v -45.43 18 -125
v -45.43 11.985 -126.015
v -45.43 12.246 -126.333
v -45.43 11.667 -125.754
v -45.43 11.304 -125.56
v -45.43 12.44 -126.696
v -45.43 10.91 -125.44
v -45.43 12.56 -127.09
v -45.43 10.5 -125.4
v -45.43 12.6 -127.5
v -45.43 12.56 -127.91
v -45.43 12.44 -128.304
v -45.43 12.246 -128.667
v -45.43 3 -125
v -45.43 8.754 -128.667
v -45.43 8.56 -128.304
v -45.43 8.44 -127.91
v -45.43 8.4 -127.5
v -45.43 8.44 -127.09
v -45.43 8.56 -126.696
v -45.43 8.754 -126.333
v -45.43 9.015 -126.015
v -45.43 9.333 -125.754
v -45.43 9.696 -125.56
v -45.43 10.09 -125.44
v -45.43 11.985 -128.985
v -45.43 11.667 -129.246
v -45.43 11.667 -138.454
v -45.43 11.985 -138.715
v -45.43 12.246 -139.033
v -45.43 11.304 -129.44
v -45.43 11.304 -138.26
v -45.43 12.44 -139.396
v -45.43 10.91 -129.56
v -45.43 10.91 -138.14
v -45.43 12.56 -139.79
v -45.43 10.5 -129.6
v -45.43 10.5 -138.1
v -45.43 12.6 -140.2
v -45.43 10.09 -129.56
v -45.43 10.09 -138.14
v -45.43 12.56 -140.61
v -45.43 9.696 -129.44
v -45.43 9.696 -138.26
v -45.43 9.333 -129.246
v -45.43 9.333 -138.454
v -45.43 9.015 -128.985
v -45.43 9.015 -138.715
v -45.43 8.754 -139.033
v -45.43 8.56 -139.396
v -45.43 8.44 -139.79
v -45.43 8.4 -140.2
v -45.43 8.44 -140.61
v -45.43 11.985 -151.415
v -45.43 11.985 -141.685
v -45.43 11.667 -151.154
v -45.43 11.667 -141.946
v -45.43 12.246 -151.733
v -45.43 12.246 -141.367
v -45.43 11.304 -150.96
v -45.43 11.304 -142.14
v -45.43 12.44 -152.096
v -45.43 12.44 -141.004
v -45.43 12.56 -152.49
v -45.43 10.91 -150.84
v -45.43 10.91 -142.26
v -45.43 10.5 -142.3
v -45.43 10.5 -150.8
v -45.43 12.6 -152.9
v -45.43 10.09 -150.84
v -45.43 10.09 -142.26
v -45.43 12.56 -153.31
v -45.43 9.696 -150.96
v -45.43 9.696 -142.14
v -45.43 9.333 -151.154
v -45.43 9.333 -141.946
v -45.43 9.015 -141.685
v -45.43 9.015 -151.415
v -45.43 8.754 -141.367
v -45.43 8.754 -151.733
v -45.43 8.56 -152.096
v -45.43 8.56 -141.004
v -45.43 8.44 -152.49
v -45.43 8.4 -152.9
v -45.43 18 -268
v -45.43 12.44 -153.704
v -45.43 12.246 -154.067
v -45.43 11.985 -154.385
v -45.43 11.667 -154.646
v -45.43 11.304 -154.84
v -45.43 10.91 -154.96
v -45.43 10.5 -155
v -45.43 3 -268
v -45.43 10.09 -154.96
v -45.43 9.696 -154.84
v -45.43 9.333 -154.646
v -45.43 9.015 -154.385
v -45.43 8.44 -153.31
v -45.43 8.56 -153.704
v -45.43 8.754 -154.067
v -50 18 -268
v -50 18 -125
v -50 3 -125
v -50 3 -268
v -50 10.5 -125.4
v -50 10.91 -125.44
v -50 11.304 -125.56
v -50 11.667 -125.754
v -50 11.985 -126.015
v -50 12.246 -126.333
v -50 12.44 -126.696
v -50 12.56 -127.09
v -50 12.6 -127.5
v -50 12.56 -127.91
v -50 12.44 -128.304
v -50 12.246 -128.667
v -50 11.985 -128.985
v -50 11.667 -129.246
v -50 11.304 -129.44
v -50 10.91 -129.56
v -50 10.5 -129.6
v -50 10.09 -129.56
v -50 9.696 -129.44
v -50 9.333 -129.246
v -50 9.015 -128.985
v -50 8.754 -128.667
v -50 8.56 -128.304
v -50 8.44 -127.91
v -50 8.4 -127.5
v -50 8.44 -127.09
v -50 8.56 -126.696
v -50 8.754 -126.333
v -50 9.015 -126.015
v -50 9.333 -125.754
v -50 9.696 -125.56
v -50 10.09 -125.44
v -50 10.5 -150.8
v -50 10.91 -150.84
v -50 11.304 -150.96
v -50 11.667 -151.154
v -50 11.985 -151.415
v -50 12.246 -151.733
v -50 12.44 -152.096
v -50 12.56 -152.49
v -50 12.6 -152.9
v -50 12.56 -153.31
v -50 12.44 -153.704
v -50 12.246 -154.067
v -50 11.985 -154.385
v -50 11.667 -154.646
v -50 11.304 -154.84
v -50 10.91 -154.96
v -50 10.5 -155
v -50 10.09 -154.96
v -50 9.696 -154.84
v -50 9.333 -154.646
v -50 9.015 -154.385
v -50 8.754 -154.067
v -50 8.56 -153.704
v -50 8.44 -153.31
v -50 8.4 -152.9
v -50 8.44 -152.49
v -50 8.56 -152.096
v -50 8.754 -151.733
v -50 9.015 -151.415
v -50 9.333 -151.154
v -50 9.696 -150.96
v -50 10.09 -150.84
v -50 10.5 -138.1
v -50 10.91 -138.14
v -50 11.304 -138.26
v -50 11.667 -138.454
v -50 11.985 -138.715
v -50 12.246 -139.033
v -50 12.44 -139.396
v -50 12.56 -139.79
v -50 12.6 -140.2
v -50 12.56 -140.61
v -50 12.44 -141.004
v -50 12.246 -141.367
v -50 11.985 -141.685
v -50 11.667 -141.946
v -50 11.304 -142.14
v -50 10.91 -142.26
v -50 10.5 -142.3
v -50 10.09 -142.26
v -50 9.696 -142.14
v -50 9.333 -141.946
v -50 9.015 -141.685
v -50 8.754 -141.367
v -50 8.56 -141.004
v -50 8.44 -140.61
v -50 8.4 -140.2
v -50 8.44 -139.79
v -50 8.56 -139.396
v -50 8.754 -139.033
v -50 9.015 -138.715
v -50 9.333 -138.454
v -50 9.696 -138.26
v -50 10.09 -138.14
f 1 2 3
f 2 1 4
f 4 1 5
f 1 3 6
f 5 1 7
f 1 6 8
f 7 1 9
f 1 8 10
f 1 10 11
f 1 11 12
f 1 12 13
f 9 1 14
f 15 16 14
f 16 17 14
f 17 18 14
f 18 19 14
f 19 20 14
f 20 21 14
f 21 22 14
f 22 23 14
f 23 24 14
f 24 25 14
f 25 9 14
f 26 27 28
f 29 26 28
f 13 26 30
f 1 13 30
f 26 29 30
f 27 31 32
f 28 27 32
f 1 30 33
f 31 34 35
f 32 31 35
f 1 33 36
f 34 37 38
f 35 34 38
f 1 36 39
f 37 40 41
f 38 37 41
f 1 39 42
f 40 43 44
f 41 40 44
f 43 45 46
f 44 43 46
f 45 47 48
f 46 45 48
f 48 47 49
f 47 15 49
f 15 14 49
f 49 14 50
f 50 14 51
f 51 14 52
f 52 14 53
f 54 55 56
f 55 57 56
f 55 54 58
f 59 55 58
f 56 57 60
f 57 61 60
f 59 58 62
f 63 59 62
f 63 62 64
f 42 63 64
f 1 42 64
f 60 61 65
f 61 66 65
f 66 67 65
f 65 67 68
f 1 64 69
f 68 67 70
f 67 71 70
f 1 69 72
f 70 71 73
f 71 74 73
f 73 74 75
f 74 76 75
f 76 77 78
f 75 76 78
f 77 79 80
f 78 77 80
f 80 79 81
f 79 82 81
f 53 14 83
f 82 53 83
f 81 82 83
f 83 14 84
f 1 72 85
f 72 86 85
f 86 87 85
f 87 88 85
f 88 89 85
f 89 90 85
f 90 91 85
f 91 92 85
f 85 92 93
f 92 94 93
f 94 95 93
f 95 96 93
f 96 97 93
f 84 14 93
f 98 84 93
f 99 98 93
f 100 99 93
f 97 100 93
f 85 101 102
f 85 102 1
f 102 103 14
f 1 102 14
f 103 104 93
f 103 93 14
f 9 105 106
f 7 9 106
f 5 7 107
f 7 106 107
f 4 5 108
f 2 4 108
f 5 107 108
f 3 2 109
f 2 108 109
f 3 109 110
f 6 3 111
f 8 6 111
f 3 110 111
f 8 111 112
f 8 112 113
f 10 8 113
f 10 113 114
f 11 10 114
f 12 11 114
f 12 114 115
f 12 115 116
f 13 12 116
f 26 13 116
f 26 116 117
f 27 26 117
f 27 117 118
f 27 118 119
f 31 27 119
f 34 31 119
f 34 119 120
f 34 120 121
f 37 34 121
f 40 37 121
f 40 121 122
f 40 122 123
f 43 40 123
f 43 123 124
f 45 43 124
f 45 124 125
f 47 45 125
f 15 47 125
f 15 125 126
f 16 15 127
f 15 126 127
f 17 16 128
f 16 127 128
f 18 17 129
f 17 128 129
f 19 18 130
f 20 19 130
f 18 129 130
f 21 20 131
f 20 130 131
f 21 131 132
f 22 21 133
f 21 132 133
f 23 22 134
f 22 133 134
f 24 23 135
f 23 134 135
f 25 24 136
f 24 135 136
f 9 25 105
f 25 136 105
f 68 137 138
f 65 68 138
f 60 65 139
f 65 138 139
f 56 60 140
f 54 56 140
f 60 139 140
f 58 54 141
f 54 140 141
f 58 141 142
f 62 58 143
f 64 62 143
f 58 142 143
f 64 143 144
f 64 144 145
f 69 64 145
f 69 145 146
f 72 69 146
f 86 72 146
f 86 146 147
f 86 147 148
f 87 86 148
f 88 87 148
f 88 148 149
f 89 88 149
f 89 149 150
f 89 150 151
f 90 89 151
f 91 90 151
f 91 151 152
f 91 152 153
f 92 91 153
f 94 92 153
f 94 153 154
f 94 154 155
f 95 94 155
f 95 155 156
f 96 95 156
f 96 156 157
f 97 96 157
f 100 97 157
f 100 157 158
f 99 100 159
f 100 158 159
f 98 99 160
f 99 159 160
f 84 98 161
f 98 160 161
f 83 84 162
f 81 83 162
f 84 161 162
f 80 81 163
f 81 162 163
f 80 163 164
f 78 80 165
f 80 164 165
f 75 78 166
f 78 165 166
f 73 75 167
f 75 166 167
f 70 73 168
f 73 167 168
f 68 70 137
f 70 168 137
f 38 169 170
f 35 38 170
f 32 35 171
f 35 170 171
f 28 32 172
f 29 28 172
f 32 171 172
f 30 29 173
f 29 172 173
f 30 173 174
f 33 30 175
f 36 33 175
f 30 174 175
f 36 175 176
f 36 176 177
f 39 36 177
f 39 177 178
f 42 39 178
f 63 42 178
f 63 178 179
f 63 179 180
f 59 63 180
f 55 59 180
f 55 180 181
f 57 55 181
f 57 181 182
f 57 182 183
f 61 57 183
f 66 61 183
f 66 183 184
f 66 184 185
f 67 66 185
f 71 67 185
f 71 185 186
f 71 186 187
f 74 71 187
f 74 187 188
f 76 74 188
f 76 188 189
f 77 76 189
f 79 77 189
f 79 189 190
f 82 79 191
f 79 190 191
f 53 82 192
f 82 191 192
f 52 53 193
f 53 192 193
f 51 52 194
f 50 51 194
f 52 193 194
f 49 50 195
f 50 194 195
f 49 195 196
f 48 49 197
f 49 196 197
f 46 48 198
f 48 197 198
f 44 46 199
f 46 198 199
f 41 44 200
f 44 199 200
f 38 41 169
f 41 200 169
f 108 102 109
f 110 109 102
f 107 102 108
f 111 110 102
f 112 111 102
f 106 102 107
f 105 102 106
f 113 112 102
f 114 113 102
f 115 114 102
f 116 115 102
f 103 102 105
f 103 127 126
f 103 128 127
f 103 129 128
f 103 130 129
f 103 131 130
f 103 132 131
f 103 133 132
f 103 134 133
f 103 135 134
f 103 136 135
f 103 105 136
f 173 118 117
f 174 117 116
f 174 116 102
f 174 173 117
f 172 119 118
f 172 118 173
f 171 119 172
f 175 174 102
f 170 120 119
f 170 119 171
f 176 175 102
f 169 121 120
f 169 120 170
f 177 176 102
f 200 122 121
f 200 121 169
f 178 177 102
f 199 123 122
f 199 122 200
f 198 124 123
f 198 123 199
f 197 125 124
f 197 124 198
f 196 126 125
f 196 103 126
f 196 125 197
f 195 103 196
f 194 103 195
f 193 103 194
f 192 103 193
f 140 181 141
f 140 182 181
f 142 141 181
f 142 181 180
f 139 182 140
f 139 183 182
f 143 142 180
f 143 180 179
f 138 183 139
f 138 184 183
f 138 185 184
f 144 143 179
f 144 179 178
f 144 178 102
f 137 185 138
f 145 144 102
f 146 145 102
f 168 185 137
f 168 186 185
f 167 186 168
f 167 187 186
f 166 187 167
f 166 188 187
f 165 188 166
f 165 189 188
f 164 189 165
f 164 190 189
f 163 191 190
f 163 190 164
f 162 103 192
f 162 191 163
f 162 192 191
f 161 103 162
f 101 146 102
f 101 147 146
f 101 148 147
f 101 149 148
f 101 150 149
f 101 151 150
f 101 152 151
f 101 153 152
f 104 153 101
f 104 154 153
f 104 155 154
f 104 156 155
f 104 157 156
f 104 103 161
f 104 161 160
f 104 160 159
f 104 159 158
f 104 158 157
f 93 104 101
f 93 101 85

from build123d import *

# Parameters (mm, degrees)
SKETCH1_W           = 4.57
SKETCH1_H           = 143
BOSS_EXTRUDE1_DEPTH = 18
SKETCH2_R           = 2.1
CUT_EXTRUDE1_DEPTH  = 18
SKETCH3_W           = 145
SKETCH3_H           = 3
CUT_EXTRUDE2_DEPTH  = 10


with BuildPart() as part:
    # Sketch1 → Boss-Extrude1 (new body)
    with BuildSketch(Plane(origin=(0, 0, 0), x_dir=(1, 0, 0), z_dir=(0, 1, 0))):
        with Locations((-47.715, 196.5)):
            Rectangle(SKETCH1_W, SKETCH1_H)
    extrude(amount=BOSS_EXTRUDE1_DEPTH)

    # Sketch2 → Cut-Extrude1 (cut)
    with BuildSketch(Plane.ZY.offset(50)):
        with Locations((-127.5, 10.5)):
            Circle(SKETCH2_R)
        with Locations((-140.2, 10.5)):
            Circle(SKETCH2_R)
        with Locations((-152.9, 10.5)):
            Circle(SKETCH2_R)
    extrude(amount=-CUT_EXTRUDE1_DEPTH, mode=Mode.SUBTRACT)

    # Sketch3 → Cut-Extrude2 (cut)
    with BuildSketch(Plane.ZY.offset(50)):
        with Locations((-197.5, 1.5)):
            Rectangle(SKETCH3_W, SKETCH3_H)
    extrude(amount=-CUT_EXTRUDE2_DEPTH, mode=Mode.SUBTRACT)


solid = part.part
